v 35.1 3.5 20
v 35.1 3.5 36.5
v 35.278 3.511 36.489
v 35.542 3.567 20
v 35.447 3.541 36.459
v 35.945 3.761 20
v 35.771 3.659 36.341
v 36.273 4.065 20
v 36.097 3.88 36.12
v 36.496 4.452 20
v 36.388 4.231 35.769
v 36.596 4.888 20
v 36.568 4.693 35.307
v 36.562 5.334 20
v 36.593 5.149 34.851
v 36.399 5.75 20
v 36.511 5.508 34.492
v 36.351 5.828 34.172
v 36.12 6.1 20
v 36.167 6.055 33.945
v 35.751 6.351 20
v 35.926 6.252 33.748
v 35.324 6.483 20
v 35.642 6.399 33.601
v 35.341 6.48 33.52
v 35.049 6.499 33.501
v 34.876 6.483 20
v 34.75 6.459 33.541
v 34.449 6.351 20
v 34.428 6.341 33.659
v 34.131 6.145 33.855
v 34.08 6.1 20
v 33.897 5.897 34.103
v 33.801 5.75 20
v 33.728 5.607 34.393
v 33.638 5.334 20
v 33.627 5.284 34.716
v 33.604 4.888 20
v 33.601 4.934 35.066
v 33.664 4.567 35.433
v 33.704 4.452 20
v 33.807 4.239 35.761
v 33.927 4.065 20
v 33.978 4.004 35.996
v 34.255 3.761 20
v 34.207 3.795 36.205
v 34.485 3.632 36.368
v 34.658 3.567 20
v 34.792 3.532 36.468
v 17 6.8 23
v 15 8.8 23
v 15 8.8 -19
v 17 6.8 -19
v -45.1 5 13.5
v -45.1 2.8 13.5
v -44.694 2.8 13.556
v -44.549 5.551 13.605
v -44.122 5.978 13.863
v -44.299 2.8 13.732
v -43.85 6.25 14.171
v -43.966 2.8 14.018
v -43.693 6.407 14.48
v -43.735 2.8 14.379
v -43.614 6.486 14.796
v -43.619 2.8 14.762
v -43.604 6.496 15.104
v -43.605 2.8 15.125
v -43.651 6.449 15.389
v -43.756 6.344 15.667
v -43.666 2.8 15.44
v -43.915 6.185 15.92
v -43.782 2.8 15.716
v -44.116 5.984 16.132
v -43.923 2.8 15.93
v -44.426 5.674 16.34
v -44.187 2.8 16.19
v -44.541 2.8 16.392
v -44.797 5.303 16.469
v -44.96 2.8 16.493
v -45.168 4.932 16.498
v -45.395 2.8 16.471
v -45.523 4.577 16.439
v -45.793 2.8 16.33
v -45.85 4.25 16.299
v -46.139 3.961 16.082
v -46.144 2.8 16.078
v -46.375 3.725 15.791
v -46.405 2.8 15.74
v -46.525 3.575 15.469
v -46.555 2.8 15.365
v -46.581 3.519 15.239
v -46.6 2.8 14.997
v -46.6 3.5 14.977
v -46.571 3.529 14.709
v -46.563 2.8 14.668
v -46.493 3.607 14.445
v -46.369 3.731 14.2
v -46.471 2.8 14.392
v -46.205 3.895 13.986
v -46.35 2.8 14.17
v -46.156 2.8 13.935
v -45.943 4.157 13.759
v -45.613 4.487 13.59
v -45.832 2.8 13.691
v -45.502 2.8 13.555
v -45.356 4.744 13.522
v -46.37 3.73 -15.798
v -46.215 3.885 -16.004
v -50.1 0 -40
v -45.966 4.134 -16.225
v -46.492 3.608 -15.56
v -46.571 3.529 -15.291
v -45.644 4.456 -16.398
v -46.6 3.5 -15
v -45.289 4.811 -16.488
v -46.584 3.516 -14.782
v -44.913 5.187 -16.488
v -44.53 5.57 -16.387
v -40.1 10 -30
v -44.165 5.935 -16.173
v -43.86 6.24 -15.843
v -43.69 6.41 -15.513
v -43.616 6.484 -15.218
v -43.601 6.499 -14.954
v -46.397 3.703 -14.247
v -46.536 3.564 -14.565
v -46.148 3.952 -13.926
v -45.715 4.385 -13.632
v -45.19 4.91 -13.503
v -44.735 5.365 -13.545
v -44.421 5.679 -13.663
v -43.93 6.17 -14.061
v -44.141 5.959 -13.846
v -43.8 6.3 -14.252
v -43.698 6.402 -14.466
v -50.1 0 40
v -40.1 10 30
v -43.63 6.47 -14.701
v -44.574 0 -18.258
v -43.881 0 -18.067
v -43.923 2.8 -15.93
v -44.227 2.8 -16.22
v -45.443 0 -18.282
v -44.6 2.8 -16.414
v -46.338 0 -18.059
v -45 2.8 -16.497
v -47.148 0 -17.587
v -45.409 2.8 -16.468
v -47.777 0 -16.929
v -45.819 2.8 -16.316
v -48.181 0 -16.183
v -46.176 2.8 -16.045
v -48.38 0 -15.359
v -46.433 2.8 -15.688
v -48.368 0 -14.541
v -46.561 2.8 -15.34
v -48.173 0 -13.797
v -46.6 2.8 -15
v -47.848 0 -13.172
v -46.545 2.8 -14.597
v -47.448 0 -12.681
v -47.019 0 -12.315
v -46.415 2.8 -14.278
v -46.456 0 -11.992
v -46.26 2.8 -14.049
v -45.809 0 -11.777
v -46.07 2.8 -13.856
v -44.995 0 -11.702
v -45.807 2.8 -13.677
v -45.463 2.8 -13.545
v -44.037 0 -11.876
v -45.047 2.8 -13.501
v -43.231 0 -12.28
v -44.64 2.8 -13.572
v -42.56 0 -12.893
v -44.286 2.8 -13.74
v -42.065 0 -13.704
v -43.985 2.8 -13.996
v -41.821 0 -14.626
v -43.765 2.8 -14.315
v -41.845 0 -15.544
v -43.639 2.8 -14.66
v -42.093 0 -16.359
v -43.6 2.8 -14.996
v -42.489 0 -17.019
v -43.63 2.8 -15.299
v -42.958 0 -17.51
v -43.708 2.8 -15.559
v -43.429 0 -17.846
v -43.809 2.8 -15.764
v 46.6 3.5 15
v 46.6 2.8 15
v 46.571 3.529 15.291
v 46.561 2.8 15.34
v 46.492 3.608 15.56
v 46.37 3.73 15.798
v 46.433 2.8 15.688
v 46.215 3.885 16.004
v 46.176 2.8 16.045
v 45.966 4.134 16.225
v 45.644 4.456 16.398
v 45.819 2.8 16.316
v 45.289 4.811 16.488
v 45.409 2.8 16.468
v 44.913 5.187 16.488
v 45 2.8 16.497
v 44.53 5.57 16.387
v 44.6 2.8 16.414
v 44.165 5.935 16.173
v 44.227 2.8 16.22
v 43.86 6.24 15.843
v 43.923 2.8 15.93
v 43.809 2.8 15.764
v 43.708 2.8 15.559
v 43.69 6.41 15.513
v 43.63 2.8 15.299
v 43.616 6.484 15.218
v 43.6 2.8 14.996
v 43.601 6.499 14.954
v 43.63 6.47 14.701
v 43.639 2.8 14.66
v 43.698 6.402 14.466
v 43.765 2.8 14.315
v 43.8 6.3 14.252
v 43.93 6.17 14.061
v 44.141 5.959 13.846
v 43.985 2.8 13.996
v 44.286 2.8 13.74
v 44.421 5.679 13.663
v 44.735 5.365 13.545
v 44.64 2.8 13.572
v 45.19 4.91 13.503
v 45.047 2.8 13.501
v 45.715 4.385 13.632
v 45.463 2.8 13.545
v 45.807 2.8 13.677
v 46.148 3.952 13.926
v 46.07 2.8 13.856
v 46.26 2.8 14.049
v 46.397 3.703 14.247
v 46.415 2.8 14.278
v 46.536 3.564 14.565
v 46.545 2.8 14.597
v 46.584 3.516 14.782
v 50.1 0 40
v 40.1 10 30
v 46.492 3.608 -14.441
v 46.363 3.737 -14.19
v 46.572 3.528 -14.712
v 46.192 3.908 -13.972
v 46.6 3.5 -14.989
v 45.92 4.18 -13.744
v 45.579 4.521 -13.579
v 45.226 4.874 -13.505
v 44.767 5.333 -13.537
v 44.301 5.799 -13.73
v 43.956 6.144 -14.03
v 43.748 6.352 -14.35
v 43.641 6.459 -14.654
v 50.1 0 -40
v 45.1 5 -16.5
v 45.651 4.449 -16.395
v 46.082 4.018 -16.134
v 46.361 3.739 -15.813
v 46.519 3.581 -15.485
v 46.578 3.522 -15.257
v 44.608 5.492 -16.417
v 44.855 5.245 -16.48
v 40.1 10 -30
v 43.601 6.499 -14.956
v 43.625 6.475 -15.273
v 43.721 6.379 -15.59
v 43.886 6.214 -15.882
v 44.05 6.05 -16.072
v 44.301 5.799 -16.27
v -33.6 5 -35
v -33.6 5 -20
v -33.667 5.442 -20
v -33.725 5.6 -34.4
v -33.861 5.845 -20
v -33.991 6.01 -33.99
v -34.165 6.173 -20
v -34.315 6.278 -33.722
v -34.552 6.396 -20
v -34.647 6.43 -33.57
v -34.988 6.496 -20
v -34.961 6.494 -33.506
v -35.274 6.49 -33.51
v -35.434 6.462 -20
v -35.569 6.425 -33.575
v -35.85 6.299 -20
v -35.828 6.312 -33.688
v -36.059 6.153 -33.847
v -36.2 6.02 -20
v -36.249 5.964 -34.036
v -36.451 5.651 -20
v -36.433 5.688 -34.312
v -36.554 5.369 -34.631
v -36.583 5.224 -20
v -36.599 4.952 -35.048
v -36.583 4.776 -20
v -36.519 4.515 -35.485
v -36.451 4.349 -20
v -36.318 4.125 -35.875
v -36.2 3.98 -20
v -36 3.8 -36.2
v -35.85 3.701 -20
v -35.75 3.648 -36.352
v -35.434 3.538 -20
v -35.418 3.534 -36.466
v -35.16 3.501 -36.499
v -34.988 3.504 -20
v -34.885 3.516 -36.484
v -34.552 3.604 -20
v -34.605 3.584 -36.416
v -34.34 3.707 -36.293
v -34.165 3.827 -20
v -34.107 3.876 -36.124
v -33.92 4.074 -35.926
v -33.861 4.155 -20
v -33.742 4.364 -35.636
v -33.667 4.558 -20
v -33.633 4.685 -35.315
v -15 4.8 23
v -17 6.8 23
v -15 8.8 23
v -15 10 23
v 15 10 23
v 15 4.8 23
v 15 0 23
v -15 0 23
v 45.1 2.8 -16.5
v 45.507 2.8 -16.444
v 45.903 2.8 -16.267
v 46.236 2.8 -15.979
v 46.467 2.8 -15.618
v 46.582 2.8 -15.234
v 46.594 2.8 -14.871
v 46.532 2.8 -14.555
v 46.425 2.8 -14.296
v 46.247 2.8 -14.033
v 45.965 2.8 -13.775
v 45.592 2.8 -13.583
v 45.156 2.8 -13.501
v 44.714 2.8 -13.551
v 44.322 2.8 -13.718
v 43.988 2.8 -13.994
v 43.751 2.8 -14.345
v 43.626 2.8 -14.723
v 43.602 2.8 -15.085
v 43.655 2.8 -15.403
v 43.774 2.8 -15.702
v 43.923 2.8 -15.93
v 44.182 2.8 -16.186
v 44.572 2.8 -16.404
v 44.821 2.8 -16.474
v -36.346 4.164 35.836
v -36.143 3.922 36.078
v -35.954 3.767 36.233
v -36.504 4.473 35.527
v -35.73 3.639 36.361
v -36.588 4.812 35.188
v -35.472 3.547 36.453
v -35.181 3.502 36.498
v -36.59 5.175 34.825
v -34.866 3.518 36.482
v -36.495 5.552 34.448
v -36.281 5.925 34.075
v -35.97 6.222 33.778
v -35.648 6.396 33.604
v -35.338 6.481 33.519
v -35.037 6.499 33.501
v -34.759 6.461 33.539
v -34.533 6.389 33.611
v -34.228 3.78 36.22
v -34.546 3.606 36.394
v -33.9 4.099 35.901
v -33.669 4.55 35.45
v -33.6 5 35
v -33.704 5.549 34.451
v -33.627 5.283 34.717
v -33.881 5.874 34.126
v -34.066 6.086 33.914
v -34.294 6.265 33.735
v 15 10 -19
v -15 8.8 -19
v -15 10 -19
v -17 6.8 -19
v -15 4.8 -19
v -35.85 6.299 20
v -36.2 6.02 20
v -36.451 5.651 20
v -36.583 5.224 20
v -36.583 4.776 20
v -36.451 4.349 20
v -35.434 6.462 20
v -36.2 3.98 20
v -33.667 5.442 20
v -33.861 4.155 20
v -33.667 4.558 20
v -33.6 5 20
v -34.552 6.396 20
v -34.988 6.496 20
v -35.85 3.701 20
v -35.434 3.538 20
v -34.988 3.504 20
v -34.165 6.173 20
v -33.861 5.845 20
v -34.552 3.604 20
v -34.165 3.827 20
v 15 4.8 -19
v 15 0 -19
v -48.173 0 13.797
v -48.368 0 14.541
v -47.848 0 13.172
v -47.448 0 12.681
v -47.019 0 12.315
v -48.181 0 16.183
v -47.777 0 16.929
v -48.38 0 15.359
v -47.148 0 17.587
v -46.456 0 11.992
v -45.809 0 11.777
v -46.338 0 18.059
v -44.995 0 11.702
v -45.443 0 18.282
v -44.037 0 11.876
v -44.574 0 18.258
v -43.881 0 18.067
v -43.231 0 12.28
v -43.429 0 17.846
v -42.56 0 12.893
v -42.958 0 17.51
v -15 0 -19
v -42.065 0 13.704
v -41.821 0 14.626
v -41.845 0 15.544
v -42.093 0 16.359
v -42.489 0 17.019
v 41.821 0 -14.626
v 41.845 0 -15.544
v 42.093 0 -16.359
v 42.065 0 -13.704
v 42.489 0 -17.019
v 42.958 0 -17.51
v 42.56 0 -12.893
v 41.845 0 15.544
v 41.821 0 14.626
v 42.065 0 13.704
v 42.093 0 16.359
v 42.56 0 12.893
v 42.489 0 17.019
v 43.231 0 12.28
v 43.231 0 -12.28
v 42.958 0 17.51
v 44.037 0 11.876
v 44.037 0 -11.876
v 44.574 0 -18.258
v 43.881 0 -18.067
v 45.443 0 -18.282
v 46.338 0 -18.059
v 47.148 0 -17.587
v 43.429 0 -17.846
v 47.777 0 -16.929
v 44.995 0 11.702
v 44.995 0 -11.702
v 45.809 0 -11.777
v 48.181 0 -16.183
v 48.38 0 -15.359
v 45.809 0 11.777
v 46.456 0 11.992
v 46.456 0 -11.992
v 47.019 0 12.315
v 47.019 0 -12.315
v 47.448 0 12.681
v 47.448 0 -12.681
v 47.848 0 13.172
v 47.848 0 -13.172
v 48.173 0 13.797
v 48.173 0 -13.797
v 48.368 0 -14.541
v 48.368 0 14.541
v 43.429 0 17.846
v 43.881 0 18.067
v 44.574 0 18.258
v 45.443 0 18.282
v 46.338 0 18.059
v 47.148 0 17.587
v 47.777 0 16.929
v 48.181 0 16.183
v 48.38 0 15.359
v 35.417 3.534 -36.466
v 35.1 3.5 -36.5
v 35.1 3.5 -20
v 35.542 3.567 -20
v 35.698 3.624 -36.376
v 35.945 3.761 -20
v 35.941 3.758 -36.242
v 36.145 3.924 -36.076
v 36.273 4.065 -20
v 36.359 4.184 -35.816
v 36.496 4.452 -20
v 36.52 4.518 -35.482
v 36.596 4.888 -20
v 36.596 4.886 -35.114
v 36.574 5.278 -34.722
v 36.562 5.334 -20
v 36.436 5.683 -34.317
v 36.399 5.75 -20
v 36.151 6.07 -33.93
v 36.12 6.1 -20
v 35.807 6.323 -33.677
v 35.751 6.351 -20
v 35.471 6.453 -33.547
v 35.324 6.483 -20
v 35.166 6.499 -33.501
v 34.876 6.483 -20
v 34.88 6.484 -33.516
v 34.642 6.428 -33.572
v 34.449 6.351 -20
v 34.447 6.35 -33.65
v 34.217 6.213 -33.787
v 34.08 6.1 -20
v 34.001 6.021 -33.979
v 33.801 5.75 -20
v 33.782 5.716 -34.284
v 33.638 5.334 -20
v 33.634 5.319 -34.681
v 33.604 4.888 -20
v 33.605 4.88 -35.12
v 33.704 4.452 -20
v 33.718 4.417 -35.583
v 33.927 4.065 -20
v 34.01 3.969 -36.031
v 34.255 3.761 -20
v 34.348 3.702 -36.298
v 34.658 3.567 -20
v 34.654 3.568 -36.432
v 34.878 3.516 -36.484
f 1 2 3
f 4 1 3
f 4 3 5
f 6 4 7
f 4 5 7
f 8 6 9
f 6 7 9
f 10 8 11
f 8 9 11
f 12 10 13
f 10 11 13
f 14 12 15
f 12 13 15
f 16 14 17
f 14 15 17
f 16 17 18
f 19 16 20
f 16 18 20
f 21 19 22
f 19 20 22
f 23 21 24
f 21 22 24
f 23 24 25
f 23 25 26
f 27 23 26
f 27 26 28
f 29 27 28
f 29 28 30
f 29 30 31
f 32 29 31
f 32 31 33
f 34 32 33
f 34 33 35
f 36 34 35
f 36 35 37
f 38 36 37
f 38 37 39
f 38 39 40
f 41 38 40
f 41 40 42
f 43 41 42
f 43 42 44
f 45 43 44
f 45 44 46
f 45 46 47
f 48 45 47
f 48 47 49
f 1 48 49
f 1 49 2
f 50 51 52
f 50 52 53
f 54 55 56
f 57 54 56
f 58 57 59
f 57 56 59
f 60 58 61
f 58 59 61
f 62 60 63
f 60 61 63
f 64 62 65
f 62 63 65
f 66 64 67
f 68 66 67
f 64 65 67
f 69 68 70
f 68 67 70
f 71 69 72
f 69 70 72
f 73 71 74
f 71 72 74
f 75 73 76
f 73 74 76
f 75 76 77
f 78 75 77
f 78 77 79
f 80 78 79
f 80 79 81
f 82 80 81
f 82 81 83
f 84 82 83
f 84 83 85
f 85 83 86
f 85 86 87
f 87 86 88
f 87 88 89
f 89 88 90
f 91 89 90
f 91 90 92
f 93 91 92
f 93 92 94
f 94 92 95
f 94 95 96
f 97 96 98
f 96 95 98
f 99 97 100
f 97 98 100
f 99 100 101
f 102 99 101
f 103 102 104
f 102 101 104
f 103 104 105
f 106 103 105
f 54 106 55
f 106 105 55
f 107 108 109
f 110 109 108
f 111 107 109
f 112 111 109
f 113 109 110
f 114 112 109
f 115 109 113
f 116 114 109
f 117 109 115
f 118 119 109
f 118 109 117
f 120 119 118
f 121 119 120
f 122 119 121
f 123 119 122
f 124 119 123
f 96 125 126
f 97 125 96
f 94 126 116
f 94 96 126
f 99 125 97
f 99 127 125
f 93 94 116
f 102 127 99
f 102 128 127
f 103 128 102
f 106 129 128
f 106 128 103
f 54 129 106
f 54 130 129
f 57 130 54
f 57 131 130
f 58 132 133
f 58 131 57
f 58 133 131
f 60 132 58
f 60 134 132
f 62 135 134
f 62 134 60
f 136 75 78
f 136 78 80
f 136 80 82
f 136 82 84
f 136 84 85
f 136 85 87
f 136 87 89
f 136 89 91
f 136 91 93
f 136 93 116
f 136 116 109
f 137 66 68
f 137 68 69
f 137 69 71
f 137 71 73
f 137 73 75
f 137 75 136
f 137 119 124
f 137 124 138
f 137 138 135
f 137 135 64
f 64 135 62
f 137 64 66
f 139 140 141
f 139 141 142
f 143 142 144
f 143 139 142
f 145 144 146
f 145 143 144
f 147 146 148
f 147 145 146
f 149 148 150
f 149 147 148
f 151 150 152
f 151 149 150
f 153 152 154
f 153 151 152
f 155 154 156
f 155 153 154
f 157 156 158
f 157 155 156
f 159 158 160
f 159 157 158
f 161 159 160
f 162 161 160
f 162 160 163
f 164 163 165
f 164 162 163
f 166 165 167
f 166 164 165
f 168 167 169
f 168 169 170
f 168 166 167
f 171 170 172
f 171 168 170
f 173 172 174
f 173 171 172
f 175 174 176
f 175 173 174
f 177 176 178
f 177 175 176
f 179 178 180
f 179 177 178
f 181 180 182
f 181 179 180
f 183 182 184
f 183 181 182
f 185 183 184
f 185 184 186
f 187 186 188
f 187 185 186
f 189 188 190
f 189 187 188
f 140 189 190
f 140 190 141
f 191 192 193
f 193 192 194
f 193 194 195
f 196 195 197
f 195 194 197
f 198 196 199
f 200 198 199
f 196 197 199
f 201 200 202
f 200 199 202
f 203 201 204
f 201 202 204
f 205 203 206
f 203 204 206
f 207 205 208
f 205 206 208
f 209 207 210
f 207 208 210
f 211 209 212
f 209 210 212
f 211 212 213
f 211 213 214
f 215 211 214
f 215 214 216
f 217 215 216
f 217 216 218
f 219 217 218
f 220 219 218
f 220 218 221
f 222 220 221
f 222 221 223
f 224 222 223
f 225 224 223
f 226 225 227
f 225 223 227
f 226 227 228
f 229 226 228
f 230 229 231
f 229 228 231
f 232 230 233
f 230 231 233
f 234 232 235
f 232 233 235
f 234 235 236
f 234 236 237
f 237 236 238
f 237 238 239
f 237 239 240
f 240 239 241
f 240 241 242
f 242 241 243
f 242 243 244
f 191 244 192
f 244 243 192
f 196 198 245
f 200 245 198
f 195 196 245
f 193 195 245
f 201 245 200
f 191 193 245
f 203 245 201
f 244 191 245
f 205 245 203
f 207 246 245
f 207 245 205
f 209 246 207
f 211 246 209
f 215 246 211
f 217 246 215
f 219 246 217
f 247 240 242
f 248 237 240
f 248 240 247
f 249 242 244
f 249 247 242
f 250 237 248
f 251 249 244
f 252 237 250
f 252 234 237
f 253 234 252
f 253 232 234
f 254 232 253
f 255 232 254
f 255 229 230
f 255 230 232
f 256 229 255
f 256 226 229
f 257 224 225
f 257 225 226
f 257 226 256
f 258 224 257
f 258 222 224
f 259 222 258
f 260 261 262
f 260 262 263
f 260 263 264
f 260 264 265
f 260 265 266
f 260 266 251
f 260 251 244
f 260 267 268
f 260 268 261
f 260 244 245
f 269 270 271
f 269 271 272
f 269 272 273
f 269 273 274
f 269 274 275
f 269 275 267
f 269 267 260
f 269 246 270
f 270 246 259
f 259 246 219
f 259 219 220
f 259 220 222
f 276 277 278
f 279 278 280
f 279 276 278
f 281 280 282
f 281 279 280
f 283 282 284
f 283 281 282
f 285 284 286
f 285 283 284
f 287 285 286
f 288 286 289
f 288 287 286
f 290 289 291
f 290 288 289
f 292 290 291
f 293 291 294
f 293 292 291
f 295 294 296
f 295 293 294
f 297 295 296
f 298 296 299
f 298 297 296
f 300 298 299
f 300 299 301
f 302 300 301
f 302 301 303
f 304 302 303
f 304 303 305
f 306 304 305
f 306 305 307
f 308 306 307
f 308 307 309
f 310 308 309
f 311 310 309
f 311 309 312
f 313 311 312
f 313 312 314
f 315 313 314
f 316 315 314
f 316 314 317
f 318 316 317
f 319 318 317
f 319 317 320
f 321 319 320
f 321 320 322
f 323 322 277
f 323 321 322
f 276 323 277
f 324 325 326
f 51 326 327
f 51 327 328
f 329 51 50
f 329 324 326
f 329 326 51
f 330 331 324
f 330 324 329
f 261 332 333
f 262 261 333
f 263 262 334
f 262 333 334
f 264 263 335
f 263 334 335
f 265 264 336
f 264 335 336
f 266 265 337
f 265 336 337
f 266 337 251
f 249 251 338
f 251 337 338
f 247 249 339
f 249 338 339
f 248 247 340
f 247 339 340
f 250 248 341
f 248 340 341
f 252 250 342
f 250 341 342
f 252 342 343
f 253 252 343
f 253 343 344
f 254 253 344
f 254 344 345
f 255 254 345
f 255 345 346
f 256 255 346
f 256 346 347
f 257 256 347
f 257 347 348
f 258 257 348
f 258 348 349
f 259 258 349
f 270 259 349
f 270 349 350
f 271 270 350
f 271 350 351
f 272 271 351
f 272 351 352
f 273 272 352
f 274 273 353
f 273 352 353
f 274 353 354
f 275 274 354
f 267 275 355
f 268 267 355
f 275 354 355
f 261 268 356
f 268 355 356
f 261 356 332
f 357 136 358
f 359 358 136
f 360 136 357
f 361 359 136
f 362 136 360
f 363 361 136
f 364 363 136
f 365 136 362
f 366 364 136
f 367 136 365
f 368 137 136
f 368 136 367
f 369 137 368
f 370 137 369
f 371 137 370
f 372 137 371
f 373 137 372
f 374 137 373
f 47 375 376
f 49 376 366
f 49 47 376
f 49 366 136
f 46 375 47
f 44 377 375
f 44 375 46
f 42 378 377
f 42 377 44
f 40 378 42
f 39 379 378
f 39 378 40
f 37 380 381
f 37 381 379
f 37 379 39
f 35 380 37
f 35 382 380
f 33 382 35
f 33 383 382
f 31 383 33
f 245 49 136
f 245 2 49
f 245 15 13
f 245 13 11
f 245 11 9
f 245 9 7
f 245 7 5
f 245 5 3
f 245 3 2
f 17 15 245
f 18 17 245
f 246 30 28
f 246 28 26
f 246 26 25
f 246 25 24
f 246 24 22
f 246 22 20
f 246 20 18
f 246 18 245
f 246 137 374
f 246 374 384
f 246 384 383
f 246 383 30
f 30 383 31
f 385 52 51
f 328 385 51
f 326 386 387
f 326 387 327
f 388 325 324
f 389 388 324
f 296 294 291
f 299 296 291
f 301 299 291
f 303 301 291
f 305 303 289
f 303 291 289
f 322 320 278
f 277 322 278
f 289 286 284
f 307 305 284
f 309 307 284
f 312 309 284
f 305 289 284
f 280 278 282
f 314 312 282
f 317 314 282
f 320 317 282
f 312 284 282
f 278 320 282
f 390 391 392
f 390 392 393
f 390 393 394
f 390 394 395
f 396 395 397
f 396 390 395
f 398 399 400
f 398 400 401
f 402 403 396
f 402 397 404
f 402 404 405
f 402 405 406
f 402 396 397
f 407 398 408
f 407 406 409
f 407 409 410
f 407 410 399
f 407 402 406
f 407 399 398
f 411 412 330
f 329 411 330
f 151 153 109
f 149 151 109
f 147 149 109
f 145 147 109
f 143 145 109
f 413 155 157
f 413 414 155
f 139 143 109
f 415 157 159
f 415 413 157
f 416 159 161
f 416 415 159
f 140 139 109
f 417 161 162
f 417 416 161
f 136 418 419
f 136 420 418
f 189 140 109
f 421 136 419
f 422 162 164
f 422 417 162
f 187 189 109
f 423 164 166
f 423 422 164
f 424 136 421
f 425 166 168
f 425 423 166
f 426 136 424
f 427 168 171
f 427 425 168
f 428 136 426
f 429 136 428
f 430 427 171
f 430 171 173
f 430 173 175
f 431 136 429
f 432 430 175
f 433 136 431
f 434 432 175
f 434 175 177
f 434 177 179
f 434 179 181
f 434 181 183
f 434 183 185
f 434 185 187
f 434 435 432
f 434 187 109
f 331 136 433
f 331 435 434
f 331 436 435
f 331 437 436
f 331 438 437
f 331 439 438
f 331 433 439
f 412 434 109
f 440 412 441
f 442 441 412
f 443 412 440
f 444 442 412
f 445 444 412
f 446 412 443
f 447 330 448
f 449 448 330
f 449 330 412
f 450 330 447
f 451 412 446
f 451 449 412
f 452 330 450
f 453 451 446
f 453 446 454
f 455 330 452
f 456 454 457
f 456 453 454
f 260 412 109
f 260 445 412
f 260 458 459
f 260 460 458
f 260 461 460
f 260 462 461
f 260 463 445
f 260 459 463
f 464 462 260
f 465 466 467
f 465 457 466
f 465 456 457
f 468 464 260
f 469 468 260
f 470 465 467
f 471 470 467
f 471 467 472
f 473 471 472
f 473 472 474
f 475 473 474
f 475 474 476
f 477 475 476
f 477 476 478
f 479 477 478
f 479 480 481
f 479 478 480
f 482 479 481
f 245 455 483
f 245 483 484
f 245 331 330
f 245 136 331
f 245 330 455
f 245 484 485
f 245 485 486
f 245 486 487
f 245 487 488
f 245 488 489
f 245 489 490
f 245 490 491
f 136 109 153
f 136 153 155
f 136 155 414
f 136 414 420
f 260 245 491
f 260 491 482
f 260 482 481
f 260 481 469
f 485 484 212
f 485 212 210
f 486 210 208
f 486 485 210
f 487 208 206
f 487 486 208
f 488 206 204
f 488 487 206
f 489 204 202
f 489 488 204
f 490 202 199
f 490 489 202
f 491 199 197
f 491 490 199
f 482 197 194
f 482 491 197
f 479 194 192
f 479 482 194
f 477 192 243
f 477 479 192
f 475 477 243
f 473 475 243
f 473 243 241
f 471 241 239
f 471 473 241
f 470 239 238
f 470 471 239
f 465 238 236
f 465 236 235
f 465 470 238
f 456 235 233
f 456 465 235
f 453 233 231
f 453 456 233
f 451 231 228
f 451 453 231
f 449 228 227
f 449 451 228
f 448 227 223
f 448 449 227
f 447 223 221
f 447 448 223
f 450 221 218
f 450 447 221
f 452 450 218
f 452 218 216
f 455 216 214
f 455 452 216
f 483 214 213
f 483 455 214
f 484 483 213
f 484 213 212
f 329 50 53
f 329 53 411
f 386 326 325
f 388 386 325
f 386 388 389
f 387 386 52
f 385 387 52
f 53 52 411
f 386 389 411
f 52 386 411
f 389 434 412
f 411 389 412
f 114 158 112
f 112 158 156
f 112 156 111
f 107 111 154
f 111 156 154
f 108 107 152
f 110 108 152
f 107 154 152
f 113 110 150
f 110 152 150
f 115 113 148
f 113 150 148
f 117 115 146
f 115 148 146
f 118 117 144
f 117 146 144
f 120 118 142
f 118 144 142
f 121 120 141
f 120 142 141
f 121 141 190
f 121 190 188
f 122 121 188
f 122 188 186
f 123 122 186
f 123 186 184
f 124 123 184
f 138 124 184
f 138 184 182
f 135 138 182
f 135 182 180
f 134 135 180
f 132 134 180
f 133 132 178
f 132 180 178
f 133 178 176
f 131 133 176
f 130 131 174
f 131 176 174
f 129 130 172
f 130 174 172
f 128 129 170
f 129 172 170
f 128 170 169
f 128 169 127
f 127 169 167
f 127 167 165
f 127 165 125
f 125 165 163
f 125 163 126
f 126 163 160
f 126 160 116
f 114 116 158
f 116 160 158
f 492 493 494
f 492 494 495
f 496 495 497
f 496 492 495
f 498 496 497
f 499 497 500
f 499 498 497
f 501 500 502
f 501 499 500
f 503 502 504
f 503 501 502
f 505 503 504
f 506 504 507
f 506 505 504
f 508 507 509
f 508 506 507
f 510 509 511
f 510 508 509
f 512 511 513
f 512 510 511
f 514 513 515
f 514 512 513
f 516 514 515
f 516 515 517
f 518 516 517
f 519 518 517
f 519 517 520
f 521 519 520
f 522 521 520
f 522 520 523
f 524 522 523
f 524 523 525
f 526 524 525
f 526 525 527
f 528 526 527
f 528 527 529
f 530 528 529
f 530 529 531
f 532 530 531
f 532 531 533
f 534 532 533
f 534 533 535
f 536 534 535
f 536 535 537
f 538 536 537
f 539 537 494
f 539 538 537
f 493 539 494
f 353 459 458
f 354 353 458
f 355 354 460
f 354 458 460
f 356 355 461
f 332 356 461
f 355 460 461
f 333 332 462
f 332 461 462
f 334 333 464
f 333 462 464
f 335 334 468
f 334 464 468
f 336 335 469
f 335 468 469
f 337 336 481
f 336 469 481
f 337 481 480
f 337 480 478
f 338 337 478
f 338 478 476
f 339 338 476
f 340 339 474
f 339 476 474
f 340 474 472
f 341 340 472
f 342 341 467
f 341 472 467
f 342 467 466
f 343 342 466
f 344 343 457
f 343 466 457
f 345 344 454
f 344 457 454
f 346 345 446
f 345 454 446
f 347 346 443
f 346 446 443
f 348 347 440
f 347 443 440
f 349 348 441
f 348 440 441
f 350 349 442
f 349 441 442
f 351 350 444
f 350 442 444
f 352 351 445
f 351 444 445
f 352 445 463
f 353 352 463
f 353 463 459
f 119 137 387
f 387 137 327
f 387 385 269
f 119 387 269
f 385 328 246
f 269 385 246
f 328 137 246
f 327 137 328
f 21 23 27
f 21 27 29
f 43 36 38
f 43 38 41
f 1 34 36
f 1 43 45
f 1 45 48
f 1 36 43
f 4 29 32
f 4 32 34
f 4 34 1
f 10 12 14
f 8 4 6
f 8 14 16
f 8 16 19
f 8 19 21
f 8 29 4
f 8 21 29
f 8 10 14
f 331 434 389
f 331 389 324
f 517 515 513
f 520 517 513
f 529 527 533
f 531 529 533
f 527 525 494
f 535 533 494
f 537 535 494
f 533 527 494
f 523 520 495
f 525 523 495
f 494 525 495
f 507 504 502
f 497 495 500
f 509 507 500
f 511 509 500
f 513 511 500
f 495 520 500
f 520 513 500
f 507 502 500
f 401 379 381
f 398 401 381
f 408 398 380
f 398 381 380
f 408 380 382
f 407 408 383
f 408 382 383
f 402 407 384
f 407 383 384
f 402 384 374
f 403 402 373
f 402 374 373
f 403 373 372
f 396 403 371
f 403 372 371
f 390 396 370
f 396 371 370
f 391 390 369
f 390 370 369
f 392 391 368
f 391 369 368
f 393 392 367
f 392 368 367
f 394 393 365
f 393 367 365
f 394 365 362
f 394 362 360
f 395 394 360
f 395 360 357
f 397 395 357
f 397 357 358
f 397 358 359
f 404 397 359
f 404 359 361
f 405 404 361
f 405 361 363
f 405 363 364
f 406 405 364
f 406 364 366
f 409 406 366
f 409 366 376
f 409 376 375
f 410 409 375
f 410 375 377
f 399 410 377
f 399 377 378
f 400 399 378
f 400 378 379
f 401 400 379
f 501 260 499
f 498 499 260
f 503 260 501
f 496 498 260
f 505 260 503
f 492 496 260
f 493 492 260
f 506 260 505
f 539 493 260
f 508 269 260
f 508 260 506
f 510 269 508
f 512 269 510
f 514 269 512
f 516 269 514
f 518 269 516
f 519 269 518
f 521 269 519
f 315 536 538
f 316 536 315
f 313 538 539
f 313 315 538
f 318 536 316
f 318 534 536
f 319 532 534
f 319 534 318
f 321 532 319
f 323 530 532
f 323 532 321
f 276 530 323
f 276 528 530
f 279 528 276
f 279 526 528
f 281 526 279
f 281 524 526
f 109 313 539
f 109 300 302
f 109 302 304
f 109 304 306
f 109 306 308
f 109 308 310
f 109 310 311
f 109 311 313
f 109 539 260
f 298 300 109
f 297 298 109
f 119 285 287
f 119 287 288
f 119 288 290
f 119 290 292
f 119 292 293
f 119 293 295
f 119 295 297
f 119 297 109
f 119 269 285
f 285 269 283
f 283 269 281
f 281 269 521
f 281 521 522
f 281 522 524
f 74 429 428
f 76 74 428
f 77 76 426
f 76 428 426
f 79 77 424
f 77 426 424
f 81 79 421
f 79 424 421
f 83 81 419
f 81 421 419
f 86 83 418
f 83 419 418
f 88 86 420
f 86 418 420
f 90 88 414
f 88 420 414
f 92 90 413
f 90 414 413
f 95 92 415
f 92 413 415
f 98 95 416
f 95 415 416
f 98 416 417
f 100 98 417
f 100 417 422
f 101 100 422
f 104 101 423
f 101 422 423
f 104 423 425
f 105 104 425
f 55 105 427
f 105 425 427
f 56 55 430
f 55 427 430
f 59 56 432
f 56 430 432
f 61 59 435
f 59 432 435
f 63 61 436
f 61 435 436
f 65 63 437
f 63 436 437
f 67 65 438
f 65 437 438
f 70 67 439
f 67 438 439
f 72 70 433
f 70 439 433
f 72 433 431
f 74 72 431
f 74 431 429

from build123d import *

# Parameters (mm, degrees)
SKETCH_4_R          = 1.5
CUT_EXTRUDE_1_DEPTH = 20
SKETCH_5_R          = 1.5
CUT_EXTRUDE_2_DEPTH = 65.884590004
SKETCH3_W           = 30
SKETCH3_H           = 42
CUT_EXTRUDE1_DEPTH  = 65.884590004
CUT_EXTRUDE2_DEPTH  = 42


with BuildPart() as part:
    # Эскиз1 → По сечениям1 section 0
    with BuildSketch(Plane(origin=(0, 0, 0), x_dir=(1, 0, 0), z_dir=(0, 1, 0))):
        with BuildLine():
            Line((-50.1, -40), (50.1, -40))
            Line((50.1, -40), (50.1, 40))
            Line((50.1, 40), (-50.1, 40))
            Line((-50.1, 40), (-50.1, -40))
        make_face()
    # Эскиз2 → По сечениям1 section 1
    with BuildSketch(Plane(origin=(0, 10, 0), x_dir=(1, 0, 0), z_dir=(0, 1, 0))):
        with BuildLine():
            Line((40.1, -30), (40.1, 30))
            Line((40.1, 30), (-40.1, 30))
            Line((-40.1, 30), (-40.1, -30))
            Line((-40.1, -30), (40.1, -30))
        make_face()
    loft()

    # Эскиз4 → Вырез-Вытянуть1 (cut)
    with BuildSketch(Plane.XY.offset(40)):
        with Locations((-35.1, 5)):
            Circle(SKETCH_4_R)
        with Locations(Location((35.1, 5, 0), (0, 0, 270))):
            Circle(SKETCH_4_R)
    cut_extrude_1 = extrude(amount=-CUT_EXTRUDE_1_DEPTH, mode=Mode.SUBTRACT)

    # Зеркальное отражение1: Вырез-Вытянуть1 across plane
    add(cut_extrude_1.mirror(Plane.XY), mode=Mode.SUBTRACT)

    # Эскиз5 → Вырез-Вытянуть2 (cut, through all)
    with BuildSketch(Plane.XZ):
        with Locations(Location((-45.1, 15, 0), (0, 0, 270))):
            Circle(SKETCH_5_R)
        with Locations(Location((-45.1, -15, 0), (0, 0, 180))):
            Circle(SKETCH_5_R)
        with Locations(Location((45.1, -15, 0), (0, 0, 270))):
            Circle(SKETCH_5_R)
        with Locations((45.1, 15)):
            Circle(SKETCH_5_R)
    extrude(amount=-CUT_EXTRUDE_2_DEPTH, mode=Mode.SUBTRACT)

    # Cut-Loft1: read off the stored shape, not the designer's step
    # Cut-Loft1: loft between two sections, ruled curve by curve
    cut_loft1_from = [
        Edge.make_bspline([(-43.923484762, 2.8, 15.930490137), (-45.784465036, 2.8, 18.283520613), (-48.137495512, 2.8, 16.422540339), (-46.276515238, 2.8, 14.069509863), (-44.415534964, 2.8, 11.716479387), (-42.062504488, 2.8, 13.577459661), (-43.923484762, 2.8, 15.930490137)], [0, 0, 0, 0, 0.5, 0.5, 0.5, 1, 1, 1, 1], 3, [1, 0.333333333, 0.333333333, 1, 0.333333333, 0.333333333, 1]),
    ]
    cut_loft1_to = [
        Edge.make_bspline([(-43.881334244, 0, 18.066733405), (-50.014801053, 0, 20.504064917), (-52.452132565, 0, 14.370598107), (-46.318665756, 0, 11.933266595), (-40.185198947, 0, 9.495935083), (-37.747867435, 0, 15.629401893), (-43.881334244, 0, 18.066733405)], [0, 0, 0, 0, 0.5, 0.5, 0.5, 1, 1, 1, 1], 3, [1, 0.333333333, 0.333333333, 1, 0.333333333, 0.333333333, 1]),
    ]
    cut_loft1 = Solid(Shell([*[Face.make_surface_from_curves(cut_loft1_from[k], cut_loft1_to[k]) for k in range(1)], Face(Wire(cut_loft1_from)), Face(Wire(cut_loft1_to))]))
    add(cut_loft1, mode=Mode.SUBTRACT)

    # Mirror1: Cut-Loft1 across plane
    add(cut_loft1.mirror(Plane.XY), mode=Mode.SUBTRACT)

    # Mirror2: read off the stored shape, not the designer's step
    # Mirror2: loft between two sections, ruled curve by curve
    mirror2_from = [
        Edge.make_bspline([(43.923484762, 2.8, 15.930490137), (45.784465036, 2.8, 18.283520613), (48.137495512, 2.8, 16.422540339), (46.276515238, 2.8, 14.069509863), (44.415534964, 2.8, 11.716479387), (42.062504488, 2.8, 13.577459661), (43.923484762, 2.8, 15.930490137)], [0, 0, 0, 0, 0.5, 0.5, 0.5, 1, 1, 1, 1], 3, [1, 0.333333333, 0.333333333, 1, 0.333333333, 0.333333333, 1]),
    ]
    mirror2_to = [
        Edge.make_bspline([(43.881334244, 0, 18.066733405), (50.014801053, 0, 20.504064917), (52.452132565, 0, 14.370598107), (46.318665756, 0, 11.933266595), (40.185198947, 0, 9.495935083), (37.747867435, 0, 15.629401893), (43.881334244, 0, 18.066733405)], [0, 0, 0, 0, 0.5, 0.5, 0.5, 1, 1, 1, 1], 3, [1, 0.333333333, 0.333333333, 1, 0.333333333, 0.333333333, 1]),
    ]
    mirror2 = Solid(Shell([*[Face.make_surface_from_curves(mirror2_from[k], mirror2_to[k]) for k in range(1)], Face(Wire(mirror2_from)), Face(Wire(mirror2_to))]))
    add(mirror2, mode=Mode.SUBTRACT)

    # Mirror2 2: loft between two sections, ruled curve by curve
    mirror2_2_from = [
        Edge.make_bspline([(43.923484762, 2.8, -15.930490137), (45.784465036, 2.8, -18.283520613), (48.137495512, 2.8, -16.422540339), (46.276515238, 2.8, -14.069509863), (44.415534964, 2.8, -11.716479387), (42.062504488, 2.8, -13.577459661), (43.923484762, 2.8, -15.930490137)], [0, 0, 0, 0, 0.5, 0.5, 0.5, 1, 1, 1, 1], 3, [1, 0.333333333, 0.333333333, 1, 0.333333333, 0.333333333, 1]),
    ]
    mirror2_2_to = [
        Edge.make_bspline([(43.881334244, 0, -18.066733405), (50.014801053, 0, -20.504064917), (52.452132565, 0, -14.370598107), (46.318665756, 0, -11.933266595), (40.185198947, 0, -9.495935083), (37.747867435, 0, -15.629401893), (43.881334244, 0, -18.066733405)], [0, 0, 0, 0, 0.5, 0.5, 0.5, 1, 1, 1, 1], 3, [1, 0.333333333, 0.333333333, 1, 0.333333333, 0.333333333, 1]),
    ]
    mirror2_2 = Solid(Shell([*[Face.make_surface_from_curves(mirror2_2_from[k], mirror2_2_to[k]) for k in range(1)], Face(Wire(mirror2_2_from)), Face(Wire(mirror2_2_to))]))
    add(mirror2_2, mode=Mode.SUBTRACT)

    # Sketch3 → Cut-Extrude1 (cut, through all)
    with BuildSketch(Plane.XZ):
        with Locations((0, 2)):
            Rectangle(SKETCH3_W, SKETCH3_H)
    extrude(amount=-CUT_EXTRUDE1_DEPTH, mode=Mode.SUBTRACT)

    # Sketch4 → Cut-Extrude2 (cut)
    with BuildSketch(Plane.XY.offset(-19)):
        Polygon((-15, 8.8), (-17, 6.8), (-15, 4.8), align=None)
        Polygon((15, 4.8), (15, 8.8), (17, 6.8), align=None)
    extrude(amount=CUT_EXTRUDE2_DEPTH, mode=Mode.SUBTRACT)


solid = part.part
